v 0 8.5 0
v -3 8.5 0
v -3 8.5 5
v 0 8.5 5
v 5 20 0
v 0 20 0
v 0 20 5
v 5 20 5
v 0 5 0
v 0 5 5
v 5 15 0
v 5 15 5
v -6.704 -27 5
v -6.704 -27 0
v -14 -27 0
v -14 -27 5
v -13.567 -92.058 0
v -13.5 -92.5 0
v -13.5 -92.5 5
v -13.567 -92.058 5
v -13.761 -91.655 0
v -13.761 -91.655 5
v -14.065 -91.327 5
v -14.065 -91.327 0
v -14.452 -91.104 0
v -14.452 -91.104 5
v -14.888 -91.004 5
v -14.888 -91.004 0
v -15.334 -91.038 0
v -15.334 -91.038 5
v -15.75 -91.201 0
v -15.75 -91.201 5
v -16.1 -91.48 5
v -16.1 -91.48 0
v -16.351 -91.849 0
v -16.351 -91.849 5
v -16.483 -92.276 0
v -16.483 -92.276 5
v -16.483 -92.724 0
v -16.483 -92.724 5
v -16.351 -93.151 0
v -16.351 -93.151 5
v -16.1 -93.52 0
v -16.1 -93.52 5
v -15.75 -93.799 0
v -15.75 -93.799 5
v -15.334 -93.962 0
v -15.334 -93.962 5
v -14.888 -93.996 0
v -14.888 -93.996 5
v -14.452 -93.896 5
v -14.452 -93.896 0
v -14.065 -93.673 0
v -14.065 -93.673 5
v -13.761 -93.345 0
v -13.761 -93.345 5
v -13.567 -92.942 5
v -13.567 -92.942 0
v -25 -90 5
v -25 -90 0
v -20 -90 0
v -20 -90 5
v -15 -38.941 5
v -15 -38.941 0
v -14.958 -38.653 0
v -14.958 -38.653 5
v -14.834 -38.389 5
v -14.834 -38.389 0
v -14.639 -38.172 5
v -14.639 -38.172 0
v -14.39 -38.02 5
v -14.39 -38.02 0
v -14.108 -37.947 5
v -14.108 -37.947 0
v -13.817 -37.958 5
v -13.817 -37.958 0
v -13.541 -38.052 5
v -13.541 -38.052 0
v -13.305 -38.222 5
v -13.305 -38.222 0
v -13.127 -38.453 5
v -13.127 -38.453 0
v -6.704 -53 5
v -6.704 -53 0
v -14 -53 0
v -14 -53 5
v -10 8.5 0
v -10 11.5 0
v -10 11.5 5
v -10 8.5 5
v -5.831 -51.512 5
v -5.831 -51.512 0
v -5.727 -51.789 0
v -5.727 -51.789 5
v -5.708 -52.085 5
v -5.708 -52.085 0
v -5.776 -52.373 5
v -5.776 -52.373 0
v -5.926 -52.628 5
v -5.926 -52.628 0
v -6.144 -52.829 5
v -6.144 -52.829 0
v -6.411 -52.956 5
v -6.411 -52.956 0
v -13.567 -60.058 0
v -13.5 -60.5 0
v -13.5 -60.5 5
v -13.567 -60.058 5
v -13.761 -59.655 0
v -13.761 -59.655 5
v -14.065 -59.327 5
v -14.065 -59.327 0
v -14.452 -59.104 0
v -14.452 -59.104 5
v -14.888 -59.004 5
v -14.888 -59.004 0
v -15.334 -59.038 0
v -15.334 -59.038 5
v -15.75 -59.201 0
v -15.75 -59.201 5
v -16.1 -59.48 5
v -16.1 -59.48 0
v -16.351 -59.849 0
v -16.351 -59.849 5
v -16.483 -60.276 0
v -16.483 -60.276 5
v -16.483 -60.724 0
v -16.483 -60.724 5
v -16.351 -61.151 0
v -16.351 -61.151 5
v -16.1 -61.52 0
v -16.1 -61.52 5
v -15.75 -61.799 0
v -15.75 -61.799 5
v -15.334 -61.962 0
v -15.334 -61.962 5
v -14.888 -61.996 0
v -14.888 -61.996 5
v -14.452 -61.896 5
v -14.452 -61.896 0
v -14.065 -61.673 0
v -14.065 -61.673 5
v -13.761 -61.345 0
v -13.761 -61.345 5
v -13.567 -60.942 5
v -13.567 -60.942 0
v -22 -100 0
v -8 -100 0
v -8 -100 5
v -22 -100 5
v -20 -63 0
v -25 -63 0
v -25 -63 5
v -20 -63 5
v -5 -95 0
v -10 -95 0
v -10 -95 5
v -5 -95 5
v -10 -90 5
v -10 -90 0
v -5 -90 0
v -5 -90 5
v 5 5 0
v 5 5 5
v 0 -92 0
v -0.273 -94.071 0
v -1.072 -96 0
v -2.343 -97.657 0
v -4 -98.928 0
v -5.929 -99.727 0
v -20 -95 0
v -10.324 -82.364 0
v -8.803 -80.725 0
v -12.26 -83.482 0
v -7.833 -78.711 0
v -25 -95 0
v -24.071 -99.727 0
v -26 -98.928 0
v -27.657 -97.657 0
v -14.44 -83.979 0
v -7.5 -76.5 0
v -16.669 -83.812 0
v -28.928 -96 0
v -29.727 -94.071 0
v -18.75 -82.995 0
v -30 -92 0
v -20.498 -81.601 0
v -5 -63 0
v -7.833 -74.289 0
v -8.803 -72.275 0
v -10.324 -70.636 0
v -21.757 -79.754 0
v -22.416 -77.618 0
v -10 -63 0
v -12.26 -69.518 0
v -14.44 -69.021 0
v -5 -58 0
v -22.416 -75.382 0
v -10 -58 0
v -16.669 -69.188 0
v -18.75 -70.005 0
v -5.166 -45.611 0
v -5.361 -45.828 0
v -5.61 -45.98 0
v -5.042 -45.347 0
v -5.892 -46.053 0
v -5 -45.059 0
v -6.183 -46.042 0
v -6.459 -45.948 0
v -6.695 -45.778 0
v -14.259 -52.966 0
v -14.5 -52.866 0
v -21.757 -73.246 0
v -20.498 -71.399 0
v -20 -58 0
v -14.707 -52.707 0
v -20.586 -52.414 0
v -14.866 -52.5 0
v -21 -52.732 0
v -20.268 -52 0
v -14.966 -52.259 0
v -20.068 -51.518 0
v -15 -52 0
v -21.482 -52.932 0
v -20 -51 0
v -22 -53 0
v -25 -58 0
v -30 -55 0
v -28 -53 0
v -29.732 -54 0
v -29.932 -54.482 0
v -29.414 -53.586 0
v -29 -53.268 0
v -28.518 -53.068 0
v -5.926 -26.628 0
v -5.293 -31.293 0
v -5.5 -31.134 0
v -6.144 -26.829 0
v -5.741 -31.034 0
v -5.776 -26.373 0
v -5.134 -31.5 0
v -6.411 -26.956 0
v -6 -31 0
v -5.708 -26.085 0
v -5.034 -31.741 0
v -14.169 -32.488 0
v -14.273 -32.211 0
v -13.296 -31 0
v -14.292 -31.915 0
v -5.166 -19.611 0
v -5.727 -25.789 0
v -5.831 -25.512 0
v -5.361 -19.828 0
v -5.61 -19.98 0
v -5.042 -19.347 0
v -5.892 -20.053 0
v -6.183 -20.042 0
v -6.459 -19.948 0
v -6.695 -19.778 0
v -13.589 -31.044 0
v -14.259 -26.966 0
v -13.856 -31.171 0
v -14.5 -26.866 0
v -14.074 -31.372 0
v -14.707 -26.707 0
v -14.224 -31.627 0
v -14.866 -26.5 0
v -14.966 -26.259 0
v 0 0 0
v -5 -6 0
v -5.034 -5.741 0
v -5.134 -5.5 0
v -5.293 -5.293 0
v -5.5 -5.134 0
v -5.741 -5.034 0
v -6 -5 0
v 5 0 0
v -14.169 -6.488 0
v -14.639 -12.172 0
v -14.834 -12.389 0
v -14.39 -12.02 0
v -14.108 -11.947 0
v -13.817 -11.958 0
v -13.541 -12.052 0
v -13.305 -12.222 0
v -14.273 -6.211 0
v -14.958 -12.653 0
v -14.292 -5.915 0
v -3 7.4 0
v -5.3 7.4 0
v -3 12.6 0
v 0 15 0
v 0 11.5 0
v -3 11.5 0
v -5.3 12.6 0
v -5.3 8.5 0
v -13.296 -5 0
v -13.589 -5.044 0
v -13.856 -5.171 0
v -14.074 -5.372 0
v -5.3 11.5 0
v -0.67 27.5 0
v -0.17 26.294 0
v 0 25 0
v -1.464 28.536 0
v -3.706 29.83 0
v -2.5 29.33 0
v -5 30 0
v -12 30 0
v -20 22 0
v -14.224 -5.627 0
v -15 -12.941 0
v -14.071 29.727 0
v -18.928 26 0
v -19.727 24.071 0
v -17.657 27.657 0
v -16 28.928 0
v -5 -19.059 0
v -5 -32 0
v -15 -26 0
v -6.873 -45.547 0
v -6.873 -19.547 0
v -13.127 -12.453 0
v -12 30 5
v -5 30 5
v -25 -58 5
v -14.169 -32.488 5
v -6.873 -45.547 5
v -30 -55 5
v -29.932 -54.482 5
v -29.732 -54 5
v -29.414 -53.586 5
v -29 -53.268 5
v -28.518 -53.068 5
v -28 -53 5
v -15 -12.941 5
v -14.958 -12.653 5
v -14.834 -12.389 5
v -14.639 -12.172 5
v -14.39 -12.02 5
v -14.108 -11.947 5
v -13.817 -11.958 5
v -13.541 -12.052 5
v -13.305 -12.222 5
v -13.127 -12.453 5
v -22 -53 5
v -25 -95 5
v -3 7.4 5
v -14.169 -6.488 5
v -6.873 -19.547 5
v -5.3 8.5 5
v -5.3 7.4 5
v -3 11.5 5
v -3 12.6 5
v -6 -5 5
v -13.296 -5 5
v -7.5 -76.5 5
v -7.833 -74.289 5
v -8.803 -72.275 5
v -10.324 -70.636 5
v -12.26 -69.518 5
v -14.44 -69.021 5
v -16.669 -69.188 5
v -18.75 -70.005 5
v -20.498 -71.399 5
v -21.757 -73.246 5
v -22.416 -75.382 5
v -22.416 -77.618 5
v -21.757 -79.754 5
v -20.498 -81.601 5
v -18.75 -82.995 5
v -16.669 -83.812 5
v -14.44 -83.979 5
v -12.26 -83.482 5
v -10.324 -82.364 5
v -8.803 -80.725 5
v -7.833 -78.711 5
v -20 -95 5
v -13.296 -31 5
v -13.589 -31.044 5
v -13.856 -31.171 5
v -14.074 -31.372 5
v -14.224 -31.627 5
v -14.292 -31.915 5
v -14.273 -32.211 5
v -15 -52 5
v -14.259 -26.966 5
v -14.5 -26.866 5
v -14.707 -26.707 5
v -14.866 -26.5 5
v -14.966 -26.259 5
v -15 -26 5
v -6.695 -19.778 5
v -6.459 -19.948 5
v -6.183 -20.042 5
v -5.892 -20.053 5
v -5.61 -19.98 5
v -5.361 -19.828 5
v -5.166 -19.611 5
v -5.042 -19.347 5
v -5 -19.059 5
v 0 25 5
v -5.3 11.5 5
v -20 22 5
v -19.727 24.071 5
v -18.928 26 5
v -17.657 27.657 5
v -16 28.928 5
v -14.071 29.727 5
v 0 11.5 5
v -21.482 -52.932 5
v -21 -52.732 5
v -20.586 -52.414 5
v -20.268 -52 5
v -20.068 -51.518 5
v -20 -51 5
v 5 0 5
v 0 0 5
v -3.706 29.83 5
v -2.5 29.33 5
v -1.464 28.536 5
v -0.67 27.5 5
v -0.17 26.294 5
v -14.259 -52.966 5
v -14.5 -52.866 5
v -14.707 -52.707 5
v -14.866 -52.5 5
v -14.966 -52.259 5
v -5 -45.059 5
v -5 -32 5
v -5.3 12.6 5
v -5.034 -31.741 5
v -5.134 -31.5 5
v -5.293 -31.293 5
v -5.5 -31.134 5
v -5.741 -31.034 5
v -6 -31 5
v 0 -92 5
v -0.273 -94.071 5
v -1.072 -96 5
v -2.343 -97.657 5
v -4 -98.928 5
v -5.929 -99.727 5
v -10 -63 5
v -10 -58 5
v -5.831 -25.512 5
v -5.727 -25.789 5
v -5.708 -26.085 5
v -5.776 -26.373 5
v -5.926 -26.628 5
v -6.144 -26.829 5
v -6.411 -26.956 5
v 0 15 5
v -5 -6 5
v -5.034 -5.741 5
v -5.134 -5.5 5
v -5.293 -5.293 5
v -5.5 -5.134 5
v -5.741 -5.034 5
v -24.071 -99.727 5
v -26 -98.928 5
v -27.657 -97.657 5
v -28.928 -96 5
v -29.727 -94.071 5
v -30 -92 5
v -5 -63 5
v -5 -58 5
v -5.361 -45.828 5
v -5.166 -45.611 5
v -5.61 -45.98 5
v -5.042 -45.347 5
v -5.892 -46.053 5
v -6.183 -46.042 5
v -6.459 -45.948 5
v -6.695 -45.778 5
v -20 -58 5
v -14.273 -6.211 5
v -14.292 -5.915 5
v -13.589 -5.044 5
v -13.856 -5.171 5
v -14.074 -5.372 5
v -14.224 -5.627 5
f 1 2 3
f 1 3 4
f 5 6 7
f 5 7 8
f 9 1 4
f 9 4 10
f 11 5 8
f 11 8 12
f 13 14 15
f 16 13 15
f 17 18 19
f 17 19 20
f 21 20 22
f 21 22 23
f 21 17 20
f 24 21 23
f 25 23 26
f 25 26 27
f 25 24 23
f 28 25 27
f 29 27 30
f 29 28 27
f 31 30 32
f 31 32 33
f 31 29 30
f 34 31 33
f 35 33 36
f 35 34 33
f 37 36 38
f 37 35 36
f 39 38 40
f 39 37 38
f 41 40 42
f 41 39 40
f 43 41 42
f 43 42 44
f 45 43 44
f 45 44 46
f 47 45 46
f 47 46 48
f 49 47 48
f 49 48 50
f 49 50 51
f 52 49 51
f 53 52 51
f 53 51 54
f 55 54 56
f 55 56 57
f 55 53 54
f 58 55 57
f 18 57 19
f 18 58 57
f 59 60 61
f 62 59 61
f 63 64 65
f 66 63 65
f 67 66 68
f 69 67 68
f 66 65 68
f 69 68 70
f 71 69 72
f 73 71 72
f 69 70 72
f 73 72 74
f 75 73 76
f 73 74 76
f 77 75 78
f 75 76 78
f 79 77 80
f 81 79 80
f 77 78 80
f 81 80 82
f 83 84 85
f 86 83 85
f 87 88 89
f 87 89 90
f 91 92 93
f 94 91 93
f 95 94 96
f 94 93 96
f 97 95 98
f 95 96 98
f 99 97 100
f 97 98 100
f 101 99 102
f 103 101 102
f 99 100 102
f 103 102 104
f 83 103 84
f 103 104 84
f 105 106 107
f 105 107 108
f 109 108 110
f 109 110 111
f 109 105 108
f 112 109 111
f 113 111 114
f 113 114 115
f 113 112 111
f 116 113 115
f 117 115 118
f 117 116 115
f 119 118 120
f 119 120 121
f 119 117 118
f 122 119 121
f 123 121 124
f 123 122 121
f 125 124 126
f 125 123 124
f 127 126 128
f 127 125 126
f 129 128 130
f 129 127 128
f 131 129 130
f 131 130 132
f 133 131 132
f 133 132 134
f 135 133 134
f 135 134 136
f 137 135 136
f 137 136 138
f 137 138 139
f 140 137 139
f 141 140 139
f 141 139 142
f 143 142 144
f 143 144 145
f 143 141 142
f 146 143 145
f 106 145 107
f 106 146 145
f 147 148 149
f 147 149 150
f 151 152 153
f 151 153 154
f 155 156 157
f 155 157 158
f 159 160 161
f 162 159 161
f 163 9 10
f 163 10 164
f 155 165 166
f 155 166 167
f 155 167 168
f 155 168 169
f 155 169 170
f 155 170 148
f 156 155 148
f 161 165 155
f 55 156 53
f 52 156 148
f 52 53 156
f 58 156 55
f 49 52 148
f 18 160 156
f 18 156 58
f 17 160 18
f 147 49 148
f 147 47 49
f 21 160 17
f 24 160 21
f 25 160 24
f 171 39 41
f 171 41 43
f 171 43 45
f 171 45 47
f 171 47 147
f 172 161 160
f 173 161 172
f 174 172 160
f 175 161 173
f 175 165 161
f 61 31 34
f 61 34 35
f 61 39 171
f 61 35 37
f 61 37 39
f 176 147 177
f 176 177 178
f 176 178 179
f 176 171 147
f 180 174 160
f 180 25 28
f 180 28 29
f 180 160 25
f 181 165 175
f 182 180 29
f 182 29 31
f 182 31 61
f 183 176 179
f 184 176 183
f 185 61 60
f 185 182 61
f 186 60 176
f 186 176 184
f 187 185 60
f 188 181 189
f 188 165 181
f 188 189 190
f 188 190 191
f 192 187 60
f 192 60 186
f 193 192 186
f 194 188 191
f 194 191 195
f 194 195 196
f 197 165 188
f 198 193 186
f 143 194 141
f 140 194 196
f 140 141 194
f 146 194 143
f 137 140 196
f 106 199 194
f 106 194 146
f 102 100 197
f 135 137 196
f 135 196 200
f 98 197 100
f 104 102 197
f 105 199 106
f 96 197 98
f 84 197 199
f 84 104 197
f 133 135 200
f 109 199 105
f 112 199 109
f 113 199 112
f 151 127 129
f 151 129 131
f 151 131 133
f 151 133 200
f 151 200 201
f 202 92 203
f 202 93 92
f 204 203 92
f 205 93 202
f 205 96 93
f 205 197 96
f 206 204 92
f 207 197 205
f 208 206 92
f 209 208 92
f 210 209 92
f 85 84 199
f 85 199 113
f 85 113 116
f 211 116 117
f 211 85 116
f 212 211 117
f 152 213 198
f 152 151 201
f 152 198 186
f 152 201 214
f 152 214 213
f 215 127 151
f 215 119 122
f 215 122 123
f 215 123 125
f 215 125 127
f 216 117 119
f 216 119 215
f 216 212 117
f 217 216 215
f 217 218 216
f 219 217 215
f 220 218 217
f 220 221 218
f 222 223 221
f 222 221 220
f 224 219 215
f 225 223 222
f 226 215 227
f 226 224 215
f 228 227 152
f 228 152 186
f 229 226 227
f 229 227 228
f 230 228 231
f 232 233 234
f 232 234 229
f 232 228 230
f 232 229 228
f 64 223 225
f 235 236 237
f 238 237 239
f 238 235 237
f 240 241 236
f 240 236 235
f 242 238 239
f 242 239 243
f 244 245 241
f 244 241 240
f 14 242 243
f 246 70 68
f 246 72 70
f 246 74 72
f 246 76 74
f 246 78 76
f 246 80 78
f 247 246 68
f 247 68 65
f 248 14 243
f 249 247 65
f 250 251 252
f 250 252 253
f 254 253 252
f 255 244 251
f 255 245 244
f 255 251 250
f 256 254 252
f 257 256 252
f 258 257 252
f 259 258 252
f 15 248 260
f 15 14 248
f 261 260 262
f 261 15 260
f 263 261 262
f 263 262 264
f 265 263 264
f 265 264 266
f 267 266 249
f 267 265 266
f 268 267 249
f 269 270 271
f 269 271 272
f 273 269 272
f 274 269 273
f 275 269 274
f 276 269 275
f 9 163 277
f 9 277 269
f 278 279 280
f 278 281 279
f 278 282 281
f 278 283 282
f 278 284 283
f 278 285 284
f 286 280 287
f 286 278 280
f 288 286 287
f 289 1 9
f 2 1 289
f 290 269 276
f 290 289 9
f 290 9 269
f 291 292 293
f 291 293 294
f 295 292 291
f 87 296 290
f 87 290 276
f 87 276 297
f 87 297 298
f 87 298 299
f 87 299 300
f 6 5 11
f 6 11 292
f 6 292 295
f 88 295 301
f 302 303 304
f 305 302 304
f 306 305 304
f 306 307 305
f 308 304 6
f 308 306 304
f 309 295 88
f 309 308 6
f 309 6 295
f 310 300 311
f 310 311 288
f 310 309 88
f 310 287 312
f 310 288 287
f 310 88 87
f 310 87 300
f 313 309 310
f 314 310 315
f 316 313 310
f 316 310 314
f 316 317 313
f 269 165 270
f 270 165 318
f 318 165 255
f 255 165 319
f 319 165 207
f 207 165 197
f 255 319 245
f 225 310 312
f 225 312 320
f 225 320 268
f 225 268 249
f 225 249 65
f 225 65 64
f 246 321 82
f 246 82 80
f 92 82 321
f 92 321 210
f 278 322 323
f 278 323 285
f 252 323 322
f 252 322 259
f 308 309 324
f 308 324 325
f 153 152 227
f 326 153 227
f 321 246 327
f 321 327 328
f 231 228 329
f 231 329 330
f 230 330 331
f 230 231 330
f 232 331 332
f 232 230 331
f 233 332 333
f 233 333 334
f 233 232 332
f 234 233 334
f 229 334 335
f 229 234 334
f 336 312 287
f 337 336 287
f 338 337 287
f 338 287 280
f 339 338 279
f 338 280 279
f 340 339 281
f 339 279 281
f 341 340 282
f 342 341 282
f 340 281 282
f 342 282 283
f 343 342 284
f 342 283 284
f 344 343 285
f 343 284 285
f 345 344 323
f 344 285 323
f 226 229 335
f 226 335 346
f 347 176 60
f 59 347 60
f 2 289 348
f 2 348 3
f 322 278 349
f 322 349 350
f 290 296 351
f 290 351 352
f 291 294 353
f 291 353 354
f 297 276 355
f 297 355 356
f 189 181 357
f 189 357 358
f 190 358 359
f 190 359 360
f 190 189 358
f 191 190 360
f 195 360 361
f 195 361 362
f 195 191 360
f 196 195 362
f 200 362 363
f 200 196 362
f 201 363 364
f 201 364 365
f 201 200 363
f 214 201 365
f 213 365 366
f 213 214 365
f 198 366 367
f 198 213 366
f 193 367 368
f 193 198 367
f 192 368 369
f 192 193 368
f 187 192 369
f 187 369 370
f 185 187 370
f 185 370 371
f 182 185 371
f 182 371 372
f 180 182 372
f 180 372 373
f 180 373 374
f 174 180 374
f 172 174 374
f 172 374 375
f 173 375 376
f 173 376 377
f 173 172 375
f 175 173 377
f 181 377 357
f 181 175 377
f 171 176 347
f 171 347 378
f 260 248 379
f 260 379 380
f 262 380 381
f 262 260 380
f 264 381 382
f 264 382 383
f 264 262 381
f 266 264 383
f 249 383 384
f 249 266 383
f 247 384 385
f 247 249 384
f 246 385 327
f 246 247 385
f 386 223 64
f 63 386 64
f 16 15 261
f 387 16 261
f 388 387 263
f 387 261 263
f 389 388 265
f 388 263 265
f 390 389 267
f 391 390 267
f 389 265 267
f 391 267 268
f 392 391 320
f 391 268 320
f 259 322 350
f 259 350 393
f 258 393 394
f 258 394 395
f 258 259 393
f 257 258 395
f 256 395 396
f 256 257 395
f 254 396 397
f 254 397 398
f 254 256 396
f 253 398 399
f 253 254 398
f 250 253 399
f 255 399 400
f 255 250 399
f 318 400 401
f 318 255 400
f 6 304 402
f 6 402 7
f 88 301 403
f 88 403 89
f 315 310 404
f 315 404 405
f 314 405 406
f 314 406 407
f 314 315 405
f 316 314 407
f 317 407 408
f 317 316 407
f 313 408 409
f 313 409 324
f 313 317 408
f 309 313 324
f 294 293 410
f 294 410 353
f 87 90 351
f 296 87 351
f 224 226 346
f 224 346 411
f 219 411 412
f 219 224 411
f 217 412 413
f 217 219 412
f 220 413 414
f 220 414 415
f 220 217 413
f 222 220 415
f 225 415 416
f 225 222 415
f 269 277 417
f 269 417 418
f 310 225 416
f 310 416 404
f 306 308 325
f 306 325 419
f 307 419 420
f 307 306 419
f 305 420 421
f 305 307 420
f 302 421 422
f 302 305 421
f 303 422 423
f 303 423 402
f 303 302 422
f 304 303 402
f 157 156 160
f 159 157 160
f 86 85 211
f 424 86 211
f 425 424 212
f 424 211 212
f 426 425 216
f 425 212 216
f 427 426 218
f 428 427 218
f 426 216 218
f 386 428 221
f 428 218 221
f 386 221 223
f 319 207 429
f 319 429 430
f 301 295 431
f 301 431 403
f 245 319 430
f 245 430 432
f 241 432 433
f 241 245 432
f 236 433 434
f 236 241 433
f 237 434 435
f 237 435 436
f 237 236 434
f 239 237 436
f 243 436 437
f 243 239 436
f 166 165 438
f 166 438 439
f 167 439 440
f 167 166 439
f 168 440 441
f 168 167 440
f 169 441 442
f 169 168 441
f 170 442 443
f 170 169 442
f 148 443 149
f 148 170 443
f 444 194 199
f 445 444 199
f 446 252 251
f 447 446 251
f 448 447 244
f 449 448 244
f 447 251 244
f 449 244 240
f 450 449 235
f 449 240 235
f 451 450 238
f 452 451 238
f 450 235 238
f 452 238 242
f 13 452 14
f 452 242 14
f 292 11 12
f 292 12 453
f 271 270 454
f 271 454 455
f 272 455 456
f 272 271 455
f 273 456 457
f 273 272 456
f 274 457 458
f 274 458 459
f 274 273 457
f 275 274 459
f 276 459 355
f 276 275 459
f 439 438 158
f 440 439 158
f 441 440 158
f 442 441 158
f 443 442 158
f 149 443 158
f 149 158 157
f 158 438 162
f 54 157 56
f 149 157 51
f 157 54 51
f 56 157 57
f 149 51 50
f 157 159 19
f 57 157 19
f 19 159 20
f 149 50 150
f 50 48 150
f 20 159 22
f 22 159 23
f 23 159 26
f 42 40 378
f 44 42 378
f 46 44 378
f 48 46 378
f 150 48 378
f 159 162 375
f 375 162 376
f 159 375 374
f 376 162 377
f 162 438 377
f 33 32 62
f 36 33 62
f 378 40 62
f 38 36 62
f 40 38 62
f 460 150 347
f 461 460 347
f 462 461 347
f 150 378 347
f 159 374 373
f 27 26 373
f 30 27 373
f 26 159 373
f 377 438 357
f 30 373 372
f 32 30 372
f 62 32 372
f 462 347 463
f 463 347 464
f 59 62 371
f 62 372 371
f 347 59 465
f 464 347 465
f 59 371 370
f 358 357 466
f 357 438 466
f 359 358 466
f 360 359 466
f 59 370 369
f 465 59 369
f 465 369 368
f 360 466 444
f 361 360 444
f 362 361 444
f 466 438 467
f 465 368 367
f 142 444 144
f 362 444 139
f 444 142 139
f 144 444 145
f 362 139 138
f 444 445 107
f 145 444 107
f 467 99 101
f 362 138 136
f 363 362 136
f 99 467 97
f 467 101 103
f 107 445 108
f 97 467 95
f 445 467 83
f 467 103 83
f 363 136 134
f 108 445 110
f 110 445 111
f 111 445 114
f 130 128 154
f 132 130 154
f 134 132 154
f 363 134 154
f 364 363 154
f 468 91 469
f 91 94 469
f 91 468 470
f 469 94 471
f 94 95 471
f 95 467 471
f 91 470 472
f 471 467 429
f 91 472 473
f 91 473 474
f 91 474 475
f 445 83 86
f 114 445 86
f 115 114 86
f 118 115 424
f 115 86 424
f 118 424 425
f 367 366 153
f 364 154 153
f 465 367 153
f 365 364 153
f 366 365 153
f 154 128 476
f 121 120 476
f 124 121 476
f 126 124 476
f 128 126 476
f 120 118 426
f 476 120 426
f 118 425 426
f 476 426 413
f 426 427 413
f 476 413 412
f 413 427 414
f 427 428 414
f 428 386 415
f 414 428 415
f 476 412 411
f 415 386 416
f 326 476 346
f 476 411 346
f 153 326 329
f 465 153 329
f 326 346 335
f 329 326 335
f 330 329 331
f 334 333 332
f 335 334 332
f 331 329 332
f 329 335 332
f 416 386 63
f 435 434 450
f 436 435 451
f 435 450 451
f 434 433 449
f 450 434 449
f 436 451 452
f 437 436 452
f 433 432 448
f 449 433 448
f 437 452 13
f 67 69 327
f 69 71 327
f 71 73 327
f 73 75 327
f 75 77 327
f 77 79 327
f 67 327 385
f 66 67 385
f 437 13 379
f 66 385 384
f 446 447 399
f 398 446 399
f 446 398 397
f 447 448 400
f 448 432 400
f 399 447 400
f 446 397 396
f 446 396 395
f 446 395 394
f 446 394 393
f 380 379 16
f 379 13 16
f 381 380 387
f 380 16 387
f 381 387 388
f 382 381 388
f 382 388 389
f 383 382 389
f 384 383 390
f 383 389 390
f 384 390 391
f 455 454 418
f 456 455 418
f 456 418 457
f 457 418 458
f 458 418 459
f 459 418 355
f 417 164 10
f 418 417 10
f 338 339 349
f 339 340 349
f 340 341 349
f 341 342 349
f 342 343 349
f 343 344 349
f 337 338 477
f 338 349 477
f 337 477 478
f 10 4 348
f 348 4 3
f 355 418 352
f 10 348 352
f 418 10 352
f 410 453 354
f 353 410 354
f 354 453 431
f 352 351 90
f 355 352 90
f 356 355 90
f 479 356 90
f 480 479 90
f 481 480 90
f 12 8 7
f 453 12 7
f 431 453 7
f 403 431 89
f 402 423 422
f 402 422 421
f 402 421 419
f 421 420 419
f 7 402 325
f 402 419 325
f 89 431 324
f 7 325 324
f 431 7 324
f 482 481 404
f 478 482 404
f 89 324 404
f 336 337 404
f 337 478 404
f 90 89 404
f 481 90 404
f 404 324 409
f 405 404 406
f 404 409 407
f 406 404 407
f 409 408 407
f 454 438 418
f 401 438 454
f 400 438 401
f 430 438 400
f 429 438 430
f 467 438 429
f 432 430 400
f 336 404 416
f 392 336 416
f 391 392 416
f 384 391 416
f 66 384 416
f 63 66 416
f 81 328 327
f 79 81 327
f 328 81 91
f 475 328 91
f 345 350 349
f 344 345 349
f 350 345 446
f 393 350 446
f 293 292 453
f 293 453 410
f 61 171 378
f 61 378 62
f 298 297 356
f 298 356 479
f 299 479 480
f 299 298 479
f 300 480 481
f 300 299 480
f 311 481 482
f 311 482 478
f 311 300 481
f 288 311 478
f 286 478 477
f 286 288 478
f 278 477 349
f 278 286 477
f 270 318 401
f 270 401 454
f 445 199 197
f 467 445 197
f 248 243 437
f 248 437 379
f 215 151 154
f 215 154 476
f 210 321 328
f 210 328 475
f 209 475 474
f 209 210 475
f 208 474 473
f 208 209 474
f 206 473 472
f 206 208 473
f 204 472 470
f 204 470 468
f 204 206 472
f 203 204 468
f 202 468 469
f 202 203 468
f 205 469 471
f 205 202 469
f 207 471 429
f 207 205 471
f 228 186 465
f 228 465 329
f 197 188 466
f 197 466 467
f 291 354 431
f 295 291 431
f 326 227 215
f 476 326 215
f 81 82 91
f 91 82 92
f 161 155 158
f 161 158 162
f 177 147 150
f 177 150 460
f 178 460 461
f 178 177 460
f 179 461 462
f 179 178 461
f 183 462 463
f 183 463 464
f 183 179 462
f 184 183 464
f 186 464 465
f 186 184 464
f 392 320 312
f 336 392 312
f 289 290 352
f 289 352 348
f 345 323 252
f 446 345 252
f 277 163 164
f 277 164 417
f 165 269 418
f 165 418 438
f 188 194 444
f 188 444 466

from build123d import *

# Parameters (mm, degrees)
ESQUISSE1_R        = 7.5
ESQUISSE1_R_2      = 1.5
ESQUISSE1_W        = 5
ESQUISSE1_H        = 5
BOSS_EXTRU_1_DEPTH = 5


with BuildPart() as part:
    # Esquisse1 → Boss.-Extru.1 (new body)
    with BuildSketch(Plane.XY):
        with BuildLine():
            Line((0, 0), (0, -92))
            ThreePointArc((0, -92), (-2.343145751, -97.656854249), (-8, -100))
            Line((-8, -100), (-22, -100))
            ThreePointArc((-22, -100), (-27.656854249, -97.656854249), (-30, -92))
            Line((-30, -92), (-30, -55))
            ThreePointArc((-30, -55), (-29.414213562, -53.585786438), (-28, -53))
            Line((-28, -53), (-22, -53))
            ThreePointArc((-22, -53), (-20.585786438, -52.414213562), (-20, -51))
            Line((-20, -51), (-20, 22))
            ThreePointArc((-20, 22), (-17.656854249, 27.656854249), (-12, 30))
            Line((-12, 30), (-5, 30))
            ThreePointArc((-5, 30), (-1.464466094, 28.535533906), (0, 25))
            Line((0, 25), (0, 20))
            Line((0, 20), (5, 20))
            Line((5, 20), (5, 15))
            Line((5, 15), (0, 15))
            Line((0, 15), (0, 11.5))
            Line((0, 11.5), (-3, 11.5))
            Line((-3, 11.5), (-3, 12.6))
            Line((-3, 12.6), (-5.3, 12.6))
            Line((-5.3, 12.6), (-5.3, 11.5))
            Line((-5.3, 11.5), (-10, 11.5))
            Line((-10, 11.5), (-10, 8.5))
            Line((-10, 8.5), (-5.3, 8.5))
            Line((-5.3, 8.5), (-5.3, 7.4))
            Line((-5.3, 7.4), (-3, 7.4))
            Line((-3, 7.4), (-3, 8.5))
            Line((-3, 8.5), (0, 8.5))
            Line((0, 8.5), (0, 5))
            Line((0, 5), (5, 5))
            Line((5, 5), (5, 0))
            Line((5, 0), (0, 0))
        make_face()
        with Locations((-15, -76.5)):
            Circle(ESQUISSE1_R, mode=Mode.SUBTRACT)
        with Locations((-15, -60.5)):
            Circle(ESQUISSE1_R_2, mode=Mode.SUBTRACT)
        with Locations((-15, -92.5)):
            Circle(ESQUISSE1_R_2, mode=Mode.SUBTRACT)
        with Locations((-7.5, -92.5)):
            Rectangle(ESQUISSE1_W, ESQUISSE1_H, mode=Mode.SUBTRACT)
        with Locations((-22.5, -92.5)):
            Rectangle(ESQUISSE1_W, ESQUISSE1_H, mode=Mode.SUBTRACT)
        with Locations((-22.5, -60.5)):
            Rectangle(ESQUISSE1_W, ESQUISSE1_H, mode=Mode.SUBTRACT)
        with Locations((-7.5, -60.5)):
            Rectangle(ESQUISSE1_W, ESQUISSE1_H, mode=Mode.SUBTRACT)
        with BuildLine():
            Line((-6, -5), (-13.295840542, -5))
            ThreePointArc((-13.295840542, -5), (-14.158315423, -5.493900129), (-14.168837394, -6.487725842))
            Line((-14.168837394, -6.487725842), (-6.872996852, -19.546795671))
            ThreePointArc((-6.872996852, -19.546795671), (-5.748004813, -20.026798317), (-5, -19.059069829))
            Line((-5, -19.059069829), (-5, -6))
            ThreePointArc((-5, -6), (-5.292893219, -5.292893219), (-6, -5))
        make_face(mode=Mode.SUBTRACT)
        with BuildLine():
            Line((-13.127003148, -12.453204329), (-5.831162606, -25.512274158))
            ThreePointArc((-5.831162606, -25.512274158), (-5.841684577, -26.506099871), (-6.704159458, -27))
            Line((-6.704159458, -27), (-14, -27))
            ThreePointArc((-14, -27), (-14.707106781, -26.707106781), (-15, -26))
            Line((-15, -26), (-15, -12.940930171))
            ThreePointArc((-15, -12.940930171), (-14.251995187, -11.973201683), (-13.127003148, -12.453204329))
        make_face(mode=Mode.SUBTRACT)
        with BuildLine():
            Line((-6, -31), (-13.295840542, -31))
            ThreePointArc((-13.295840542, -31), (-14.158315423, -31.493900129), (-14.168837394, -32.487725842))
            Line((-14.168837394, -32.487725842), (-6.872996852, -45.546795671))
            ThreePointArc((-6.872996852, -45.546795671), (-5.748004813, -46.026798317), (-5, -45.059069829))
            Line((-5, -45.059069829), (-5, -32))
            ThreePointArc((-5, -32), (-5.292893219, -31.292893219), (-6, -31))
        make_face(mode=Mode.SUBTRACT)
        with BuildLine():
            Line((-13.127003148, -38.453204329), (-5.831162606, -51.512274158))
            ThreePointArc((-5.831162606, -51.512274158), (-5.841684577, -52.506099871), (-6.704159458, -53))
            Line((-6.704159458, -53), (-14, -53))
            ThreePointArc((-14, -53), (-14.707106781, -52.707106781), (-15, -52))
            Line((-15, -52), (-15, -38.940930171))
            ThreePointArc((-15, -38.940930171), (-14.251995187, -37.973201683), (-13.127003148, -38.453204329))
        make_face(mode=Mode.SUBTRACT)
    extrude(amount=BOSS_EXTRU_1_DEPTH)


solid = part.part
